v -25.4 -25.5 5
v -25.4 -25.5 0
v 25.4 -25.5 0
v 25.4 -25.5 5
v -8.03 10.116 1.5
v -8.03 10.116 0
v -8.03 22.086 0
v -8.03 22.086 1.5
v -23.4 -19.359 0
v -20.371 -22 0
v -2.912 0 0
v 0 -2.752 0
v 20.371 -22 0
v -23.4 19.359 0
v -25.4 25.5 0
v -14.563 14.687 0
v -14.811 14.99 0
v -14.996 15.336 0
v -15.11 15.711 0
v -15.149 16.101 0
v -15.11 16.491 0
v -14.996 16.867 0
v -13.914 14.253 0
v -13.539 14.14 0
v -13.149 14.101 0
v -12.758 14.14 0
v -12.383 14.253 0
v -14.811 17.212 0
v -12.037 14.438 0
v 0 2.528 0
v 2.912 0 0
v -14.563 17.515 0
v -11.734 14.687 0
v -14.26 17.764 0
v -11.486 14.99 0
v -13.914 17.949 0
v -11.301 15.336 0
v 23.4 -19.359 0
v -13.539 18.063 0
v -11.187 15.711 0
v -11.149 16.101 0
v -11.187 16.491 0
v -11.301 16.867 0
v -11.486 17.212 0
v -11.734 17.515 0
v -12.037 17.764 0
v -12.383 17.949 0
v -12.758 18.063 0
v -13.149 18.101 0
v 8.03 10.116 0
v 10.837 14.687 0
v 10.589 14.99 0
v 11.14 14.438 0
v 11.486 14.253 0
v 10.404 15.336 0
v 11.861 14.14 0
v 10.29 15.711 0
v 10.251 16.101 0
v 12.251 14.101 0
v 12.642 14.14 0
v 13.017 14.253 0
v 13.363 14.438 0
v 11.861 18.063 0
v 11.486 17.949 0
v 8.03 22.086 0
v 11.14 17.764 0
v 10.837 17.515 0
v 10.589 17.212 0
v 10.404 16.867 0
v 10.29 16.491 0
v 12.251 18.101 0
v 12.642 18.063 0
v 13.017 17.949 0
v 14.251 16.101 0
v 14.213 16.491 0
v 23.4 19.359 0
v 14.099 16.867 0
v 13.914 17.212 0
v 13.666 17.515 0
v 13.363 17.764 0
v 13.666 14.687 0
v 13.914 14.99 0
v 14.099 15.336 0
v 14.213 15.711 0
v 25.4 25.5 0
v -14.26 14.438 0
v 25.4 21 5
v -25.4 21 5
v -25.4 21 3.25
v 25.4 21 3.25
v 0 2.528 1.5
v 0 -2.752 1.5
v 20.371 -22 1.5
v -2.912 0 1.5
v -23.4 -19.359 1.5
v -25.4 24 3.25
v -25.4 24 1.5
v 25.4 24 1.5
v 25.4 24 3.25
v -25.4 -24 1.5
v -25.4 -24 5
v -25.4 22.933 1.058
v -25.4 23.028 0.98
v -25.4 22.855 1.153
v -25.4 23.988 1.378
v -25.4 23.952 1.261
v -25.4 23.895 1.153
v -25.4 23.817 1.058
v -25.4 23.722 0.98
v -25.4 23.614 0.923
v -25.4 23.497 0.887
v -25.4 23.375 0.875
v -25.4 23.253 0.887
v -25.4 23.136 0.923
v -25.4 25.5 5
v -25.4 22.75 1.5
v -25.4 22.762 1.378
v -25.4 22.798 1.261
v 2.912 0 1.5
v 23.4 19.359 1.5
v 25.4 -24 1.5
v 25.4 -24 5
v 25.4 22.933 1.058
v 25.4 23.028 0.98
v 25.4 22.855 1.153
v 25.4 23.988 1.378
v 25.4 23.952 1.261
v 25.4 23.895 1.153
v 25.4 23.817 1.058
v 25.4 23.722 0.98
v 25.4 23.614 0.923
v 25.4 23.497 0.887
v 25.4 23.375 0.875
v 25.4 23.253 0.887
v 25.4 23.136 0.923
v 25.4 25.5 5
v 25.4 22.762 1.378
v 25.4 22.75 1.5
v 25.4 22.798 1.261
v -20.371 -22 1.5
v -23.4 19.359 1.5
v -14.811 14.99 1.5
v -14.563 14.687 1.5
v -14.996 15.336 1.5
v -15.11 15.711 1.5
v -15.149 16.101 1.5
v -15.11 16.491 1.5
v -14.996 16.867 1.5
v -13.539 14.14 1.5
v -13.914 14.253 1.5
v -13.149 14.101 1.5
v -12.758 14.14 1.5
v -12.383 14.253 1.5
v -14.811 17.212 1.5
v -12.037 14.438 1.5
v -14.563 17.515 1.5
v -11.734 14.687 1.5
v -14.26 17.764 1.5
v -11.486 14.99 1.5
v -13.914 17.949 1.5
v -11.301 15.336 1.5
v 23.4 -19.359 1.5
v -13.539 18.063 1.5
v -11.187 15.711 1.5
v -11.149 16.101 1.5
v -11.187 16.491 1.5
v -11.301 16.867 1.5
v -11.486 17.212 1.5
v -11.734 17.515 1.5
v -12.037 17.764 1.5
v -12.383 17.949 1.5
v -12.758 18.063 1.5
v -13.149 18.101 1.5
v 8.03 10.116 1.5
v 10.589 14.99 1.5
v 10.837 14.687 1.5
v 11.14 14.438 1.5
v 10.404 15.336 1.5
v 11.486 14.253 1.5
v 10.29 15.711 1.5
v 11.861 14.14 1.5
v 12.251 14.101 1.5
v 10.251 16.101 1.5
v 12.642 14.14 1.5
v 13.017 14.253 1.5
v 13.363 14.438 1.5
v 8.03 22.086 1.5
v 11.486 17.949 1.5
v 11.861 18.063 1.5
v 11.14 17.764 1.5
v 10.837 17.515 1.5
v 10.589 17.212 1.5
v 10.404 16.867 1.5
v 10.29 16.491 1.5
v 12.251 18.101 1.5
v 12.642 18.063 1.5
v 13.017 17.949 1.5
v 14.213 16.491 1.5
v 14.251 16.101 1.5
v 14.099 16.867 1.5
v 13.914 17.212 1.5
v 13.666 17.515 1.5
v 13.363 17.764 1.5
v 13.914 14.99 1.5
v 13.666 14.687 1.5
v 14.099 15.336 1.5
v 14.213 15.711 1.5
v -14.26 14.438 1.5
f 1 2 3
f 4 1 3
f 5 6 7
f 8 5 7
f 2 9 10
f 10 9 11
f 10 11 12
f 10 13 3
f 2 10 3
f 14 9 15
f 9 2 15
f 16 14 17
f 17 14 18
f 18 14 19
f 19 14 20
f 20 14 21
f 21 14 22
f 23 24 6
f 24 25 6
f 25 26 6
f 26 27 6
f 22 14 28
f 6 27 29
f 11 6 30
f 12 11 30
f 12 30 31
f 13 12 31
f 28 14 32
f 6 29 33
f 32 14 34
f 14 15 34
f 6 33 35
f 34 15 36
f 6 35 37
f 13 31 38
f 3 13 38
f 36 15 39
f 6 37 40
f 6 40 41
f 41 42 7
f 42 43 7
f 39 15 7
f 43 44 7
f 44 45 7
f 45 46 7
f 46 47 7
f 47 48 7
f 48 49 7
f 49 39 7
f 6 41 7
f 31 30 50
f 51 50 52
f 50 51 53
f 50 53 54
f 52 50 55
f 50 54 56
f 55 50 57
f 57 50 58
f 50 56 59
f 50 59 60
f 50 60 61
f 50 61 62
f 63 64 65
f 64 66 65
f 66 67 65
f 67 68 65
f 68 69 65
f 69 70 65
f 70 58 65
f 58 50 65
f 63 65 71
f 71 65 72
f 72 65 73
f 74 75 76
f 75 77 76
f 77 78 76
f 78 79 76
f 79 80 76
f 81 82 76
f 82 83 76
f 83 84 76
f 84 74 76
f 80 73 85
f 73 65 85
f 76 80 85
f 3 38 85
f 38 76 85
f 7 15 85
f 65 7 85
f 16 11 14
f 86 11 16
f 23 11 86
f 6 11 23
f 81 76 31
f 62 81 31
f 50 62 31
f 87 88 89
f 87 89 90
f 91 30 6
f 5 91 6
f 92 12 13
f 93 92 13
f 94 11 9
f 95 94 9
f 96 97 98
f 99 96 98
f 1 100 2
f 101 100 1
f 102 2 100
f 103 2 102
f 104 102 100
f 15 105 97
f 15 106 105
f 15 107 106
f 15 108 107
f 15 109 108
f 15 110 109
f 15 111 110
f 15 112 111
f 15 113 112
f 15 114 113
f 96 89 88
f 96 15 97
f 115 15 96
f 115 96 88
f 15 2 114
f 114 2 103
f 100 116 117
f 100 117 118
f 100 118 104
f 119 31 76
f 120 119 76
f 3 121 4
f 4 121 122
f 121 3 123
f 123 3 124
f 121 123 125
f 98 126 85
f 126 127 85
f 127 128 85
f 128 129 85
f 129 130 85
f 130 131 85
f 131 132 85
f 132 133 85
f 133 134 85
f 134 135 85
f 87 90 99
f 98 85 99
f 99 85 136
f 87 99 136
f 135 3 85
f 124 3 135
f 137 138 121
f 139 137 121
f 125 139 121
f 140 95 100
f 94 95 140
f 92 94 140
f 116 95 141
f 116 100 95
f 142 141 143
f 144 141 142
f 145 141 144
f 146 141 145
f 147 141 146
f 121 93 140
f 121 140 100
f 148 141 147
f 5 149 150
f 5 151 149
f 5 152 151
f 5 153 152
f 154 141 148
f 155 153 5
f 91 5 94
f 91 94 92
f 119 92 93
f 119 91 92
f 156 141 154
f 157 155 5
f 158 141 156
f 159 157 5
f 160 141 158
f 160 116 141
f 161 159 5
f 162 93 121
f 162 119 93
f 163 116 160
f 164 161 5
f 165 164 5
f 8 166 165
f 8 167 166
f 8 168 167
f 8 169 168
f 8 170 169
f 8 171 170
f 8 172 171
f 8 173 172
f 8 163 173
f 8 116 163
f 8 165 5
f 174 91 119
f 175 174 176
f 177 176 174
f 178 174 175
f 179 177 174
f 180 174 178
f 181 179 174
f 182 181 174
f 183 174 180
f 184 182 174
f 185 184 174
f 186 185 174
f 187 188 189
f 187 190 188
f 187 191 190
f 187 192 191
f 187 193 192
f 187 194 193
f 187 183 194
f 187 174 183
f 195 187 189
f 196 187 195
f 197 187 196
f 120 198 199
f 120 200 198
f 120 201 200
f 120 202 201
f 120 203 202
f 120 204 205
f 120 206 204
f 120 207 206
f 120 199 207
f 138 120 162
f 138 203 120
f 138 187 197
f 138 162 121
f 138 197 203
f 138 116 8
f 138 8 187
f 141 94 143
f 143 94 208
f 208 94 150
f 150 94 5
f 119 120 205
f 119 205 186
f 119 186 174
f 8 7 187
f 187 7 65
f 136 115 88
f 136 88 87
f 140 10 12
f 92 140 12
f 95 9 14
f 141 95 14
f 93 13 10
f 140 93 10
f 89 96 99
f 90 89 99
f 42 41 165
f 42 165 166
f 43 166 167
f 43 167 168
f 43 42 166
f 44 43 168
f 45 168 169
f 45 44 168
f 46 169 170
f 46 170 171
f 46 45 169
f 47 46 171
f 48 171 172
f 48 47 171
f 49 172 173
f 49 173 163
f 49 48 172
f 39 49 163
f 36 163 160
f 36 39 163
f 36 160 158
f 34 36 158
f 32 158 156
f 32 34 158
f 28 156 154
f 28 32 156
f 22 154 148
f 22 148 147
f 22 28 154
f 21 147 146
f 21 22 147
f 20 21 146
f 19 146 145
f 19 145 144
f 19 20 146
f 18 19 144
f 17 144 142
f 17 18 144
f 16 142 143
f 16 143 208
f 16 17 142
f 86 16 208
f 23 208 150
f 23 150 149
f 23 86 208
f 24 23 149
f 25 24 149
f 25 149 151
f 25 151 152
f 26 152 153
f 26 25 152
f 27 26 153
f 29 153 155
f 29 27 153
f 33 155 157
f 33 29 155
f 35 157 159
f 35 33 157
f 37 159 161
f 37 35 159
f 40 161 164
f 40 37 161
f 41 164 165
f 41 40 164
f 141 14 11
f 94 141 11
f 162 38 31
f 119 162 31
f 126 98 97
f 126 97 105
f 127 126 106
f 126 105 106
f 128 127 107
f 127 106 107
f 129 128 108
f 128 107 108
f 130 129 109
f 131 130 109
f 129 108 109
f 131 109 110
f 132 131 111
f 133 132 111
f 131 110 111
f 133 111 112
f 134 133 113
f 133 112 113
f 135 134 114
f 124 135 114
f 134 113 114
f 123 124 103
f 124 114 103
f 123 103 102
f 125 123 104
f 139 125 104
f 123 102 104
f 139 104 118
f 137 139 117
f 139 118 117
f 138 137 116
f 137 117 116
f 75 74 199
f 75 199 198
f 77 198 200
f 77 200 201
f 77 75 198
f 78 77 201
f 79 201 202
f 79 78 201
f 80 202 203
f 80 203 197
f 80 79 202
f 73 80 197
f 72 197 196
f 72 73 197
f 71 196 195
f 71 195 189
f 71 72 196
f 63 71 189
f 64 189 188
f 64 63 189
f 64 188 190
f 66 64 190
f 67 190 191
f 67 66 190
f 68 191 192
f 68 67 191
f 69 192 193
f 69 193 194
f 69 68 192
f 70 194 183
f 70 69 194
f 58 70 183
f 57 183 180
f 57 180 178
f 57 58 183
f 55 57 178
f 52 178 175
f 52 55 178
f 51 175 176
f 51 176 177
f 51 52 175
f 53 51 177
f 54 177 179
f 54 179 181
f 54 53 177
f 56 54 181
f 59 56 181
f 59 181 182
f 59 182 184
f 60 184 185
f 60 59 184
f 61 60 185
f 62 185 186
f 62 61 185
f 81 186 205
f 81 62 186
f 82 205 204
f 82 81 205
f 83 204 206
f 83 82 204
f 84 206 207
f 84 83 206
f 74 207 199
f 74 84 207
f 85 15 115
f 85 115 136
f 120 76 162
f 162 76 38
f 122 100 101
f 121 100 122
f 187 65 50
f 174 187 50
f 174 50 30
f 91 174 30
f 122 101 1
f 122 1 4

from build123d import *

# Parameters (mm, degrees)
F0_R     = 2
F1_DEPTH = 1.5
F0_W     = 50.8
F0_H     = 1.5
F2_DEPTH = 5
F3_DEPTH = 5
F4_W     = 50.8
F4_H     = 1.75
F5_DEPTH = 3
F7_DEPTH = 50.801


with BuildPart() as f1:
    # F0 (on Top) → F1 (new body)
    with BuildSketch(Plane.XY):
        Polygon((25.4, 24), (-25.4, 24), (0, 0), align=None)
        Polygon((-8.0304443836, 10.1160742342), (-8.0304443836, 22.0862291753), (8.0304443836, 22.0862291753), (8.0304443836, 10.1160742342), (0, 2.5282527694), align=None, mode=Mode.SUBTRACT)
        with Locations((-13.1485247985, 16.1011517048)):
            Circle(F0_R, mode=Mode.SUBTRACT)
        with Locations((12.2514752015, 16.1011517048)):
            Circle(F0_R, mode=Mode.SUBTRACT)
        Polygon((0, 0), (-25.4, 24), (-25.4, -24), align=None)
        Polygon((-23.3999999466, 19.3586534352), (-2.9120917277, 0), (-23.3999999466, -19.3586534352), align=None, mode=Mode.SUBTRACT)
        Polygon((0, 0), (-25.4, -24), (25.4, -24), align=None)
        Polygon((20.3712416834, -22), (-20.3712416834, -22), (0, -2.7515826614), align=None, mode=Mode.SUBTRACT)
        Polygon((25.4, -24), (25.4, 24), (0, 0), align=None)
        Polygon((23.4, -19.3586535591), (2.91209165, 0), (23.4, 19.3586535591), align=None, mode=Mode.SUBTRACT)
    extrude(amount=F1_DEPTH)

    # F0 (on Top) → F2 (join)
    with BuildSketch(Plane.XY):
        with Locations((0, -24.75)):
            Rectangle(F0_W, F0_H)
    extrude(amount=F2_DEPTH)

    # F0 (on Top) → F3 (join)
    with BuildSketch(Plane.XY):
        with Locations((0, 24.75)):
            Rectangle(F0_W, F0_H)
    extrude(amount=F3_DEPTH)

    # F4 (on face) → F5 (join)
    with BuildSketch(Plane.XZ.offset(-24)):
        with Locations((0, 4.125)):
            Rectangle(F4_W, F4_H)
    extrude(amount=F5_DEPTH)

    # F6 (on face) → F7 (cut, through all)
    with BuildSketch(Plane(origin=(-25.4, 0, 0), x_dir=(0, -1, 0), z_dir=(-1, 0, 0))):
        with BuildLine():
            ThreePointArc((-24, 1.5), (-23.375, 0.875), (-22.75, 1.5))
            Line((-22.75, 1.5), (-24, 1.5))
        make_face()
    extrude(amount=-F7_DEPTH, mode=Mode.SUBTRACT)


solid = f1.part
